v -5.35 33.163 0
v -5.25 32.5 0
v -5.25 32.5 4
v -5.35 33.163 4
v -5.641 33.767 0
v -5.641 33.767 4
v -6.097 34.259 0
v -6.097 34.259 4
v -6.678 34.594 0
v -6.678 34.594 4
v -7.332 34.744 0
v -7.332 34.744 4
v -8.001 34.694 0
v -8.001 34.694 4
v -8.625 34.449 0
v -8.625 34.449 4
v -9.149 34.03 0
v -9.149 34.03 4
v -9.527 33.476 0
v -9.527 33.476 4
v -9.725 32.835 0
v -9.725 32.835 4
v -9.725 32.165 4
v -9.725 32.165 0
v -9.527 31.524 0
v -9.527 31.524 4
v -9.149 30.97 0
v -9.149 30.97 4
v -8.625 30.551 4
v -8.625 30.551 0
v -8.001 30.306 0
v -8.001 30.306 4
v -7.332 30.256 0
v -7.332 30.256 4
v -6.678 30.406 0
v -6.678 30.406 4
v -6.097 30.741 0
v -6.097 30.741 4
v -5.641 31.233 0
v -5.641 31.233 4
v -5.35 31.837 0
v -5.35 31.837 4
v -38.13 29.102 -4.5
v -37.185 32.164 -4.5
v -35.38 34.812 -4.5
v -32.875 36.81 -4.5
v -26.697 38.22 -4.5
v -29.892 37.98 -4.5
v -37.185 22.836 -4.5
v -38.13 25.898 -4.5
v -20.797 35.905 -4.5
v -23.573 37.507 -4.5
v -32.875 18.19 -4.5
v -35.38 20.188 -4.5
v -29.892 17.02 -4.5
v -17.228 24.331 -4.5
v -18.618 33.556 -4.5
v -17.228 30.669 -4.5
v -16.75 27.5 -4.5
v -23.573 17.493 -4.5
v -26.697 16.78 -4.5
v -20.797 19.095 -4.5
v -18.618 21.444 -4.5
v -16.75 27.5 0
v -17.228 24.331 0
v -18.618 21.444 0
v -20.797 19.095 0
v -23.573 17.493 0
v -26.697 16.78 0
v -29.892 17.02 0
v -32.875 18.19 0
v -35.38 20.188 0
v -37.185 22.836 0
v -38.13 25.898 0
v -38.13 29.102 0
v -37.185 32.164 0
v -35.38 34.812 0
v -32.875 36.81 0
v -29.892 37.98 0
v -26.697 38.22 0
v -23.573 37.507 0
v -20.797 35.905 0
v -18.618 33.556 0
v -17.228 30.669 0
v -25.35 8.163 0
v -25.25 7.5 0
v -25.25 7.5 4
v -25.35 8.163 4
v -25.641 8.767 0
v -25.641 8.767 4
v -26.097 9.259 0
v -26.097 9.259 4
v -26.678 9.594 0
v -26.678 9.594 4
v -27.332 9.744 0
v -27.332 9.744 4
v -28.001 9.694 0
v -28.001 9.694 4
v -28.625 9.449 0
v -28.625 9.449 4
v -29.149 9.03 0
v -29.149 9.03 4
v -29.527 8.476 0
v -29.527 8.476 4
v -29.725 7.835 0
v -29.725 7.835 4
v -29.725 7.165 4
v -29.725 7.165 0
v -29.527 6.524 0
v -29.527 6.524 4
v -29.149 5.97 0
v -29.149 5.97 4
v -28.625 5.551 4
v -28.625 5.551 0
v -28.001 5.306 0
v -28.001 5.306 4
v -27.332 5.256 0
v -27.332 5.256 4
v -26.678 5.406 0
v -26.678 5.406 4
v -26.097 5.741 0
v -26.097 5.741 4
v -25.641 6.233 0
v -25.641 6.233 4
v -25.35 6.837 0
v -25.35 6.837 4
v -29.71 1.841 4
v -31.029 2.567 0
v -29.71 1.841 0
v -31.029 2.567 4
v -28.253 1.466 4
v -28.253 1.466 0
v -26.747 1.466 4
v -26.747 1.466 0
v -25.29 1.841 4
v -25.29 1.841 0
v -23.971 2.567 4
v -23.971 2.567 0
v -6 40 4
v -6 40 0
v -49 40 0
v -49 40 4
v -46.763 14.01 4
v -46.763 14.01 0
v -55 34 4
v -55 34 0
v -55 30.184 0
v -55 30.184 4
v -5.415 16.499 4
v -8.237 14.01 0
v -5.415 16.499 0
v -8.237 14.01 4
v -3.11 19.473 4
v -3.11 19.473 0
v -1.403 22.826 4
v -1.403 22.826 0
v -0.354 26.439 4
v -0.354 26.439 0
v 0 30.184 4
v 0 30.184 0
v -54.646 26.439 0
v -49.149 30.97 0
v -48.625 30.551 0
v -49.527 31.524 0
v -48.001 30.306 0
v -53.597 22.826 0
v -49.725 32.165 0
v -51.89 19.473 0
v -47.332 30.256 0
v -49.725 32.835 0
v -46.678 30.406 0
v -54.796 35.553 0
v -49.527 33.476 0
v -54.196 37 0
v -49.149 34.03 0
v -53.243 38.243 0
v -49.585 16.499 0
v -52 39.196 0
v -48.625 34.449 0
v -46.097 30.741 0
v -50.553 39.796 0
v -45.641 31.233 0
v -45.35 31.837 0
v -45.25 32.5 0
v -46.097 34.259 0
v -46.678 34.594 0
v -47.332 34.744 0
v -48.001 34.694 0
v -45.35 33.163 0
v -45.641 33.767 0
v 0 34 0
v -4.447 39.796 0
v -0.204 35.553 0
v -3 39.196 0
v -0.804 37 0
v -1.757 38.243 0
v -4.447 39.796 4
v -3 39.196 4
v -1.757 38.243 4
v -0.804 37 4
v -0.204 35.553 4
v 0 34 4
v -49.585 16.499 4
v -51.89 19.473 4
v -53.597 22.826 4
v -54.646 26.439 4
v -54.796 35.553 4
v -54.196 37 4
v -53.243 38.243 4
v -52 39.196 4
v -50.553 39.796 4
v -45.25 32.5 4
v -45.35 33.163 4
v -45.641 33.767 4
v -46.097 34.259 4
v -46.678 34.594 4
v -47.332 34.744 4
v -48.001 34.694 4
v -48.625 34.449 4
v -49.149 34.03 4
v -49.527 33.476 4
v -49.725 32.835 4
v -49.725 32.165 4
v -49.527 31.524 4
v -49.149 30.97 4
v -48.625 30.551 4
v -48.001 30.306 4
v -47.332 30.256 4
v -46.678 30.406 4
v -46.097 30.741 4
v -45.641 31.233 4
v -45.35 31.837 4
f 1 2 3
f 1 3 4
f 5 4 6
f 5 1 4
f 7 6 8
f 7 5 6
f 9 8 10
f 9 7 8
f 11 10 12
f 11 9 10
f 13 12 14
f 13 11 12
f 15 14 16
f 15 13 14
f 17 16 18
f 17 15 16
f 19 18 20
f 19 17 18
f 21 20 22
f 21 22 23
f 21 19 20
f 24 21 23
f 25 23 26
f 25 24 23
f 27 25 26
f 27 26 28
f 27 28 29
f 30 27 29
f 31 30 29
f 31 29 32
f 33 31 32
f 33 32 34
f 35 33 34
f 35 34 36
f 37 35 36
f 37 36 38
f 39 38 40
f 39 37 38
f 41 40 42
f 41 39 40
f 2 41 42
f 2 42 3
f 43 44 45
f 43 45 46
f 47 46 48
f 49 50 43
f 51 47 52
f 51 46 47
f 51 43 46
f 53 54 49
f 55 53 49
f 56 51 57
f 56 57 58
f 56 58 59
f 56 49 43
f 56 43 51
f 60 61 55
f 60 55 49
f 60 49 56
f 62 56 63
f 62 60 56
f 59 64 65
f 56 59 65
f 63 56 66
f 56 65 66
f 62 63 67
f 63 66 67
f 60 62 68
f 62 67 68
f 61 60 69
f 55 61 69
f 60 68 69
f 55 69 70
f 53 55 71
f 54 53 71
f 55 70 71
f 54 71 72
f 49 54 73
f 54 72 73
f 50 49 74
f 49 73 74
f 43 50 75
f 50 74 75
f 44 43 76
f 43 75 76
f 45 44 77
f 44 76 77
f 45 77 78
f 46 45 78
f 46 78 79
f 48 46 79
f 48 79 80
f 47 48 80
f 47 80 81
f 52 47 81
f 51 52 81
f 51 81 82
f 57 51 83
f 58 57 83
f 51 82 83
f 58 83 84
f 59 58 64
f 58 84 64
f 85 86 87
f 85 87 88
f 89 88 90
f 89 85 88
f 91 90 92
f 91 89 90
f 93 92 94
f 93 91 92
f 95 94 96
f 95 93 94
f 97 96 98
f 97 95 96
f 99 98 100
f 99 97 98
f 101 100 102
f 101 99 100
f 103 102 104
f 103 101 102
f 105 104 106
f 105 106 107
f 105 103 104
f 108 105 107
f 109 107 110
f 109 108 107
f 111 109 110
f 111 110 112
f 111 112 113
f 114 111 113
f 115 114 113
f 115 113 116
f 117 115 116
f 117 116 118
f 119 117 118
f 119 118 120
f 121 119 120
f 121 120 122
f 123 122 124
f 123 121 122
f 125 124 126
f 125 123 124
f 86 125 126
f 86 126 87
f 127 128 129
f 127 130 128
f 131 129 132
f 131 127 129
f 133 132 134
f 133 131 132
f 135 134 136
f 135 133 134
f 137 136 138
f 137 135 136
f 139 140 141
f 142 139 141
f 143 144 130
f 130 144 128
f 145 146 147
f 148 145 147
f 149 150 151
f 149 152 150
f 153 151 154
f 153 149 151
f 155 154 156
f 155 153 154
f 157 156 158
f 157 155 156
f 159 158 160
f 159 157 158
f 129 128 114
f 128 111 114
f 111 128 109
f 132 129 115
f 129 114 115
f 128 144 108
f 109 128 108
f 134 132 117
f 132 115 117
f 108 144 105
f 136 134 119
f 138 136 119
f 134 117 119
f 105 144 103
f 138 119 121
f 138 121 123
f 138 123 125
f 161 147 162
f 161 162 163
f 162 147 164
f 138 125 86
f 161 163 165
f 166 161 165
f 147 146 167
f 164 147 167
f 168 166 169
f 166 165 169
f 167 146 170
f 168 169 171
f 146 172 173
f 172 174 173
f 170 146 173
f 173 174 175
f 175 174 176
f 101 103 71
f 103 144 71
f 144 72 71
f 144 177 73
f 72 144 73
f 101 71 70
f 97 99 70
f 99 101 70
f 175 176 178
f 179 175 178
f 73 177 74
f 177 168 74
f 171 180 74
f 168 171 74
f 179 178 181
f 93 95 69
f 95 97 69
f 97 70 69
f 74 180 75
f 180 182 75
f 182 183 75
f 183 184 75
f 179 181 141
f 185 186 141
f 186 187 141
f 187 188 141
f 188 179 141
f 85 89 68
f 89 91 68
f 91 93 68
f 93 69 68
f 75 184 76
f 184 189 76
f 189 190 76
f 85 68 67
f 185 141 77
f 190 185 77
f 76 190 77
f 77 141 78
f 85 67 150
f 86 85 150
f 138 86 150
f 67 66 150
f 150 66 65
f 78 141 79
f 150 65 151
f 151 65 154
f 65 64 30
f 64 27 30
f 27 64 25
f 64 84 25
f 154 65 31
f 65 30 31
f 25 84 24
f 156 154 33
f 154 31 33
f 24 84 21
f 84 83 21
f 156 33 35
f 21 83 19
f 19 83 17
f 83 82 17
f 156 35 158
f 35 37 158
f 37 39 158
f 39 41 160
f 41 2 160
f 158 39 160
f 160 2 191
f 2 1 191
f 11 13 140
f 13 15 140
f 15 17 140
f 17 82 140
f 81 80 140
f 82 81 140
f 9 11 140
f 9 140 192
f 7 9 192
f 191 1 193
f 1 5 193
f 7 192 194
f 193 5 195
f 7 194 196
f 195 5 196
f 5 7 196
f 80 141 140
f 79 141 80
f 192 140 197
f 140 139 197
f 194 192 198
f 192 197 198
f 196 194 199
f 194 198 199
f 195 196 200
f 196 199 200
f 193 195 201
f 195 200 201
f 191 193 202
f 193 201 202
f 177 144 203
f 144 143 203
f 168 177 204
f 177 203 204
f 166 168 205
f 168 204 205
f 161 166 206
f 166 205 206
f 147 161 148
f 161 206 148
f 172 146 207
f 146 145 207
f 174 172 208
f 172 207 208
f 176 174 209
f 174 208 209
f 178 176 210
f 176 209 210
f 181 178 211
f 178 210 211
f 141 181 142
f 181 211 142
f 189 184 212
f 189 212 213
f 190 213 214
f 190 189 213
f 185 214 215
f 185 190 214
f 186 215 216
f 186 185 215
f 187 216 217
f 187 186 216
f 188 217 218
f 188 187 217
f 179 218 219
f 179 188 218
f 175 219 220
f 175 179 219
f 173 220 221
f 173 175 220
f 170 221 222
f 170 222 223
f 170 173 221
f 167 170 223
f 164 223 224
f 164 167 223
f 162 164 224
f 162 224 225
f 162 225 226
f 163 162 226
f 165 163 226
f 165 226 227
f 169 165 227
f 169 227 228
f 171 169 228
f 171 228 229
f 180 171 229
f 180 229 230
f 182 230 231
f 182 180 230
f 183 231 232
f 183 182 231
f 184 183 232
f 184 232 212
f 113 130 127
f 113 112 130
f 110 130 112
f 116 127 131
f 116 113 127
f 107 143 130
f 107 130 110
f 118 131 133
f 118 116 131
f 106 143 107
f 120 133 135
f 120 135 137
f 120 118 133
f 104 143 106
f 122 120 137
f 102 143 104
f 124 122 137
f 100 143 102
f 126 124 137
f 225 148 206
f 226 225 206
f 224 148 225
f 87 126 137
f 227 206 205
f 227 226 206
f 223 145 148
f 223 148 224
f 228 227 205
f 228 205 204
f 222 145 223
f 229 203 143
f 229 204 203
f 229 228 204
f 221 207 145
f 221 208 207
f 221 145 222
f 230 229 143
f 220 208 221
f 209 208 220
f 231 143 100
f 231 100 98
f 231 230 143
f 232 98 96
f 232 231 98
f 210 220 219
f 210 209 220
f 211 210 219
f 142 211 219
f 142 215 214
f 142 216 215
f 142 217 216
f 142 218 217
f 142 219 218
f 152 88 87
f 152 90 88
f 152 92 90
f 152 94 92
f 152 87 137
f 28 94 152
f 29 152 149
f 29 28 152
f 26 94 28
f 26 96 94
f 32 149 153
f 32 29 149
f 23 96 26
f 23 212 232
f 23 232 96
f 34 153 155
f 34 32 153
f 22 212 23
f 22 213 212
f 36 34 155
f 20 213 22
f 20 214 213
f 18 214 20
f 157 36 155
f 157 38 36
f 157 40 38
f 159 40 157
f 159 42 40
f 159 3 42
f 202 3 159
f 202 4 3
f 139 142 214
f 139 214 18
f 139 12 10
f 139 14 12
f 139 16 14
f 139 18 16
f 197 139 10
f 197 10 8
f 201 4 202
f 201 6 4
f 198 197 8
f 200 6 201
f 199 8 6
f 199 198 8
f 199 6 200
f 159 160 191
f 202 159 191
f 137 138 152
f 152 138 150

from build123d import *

# Parameters (mm, degrees)
ESQUISSE1_R        = 2.25
BOSS_EXTRU_1_DEPTH = 4
CONG_2_R           = 6
CONG_3_R           = 20
ESQUISSE2_R        = 10.75
BOSS_EXTRU_2_DEPTH = 4.5


with BuildPart() as part:
    # Esquisse1 → Boss.-Extru.1 (new body)
    with BuildSketch(Plane.XY):
        Polygon((-55, 20), (-27.5, 0), (0, 20), (0, 40), (-55, 40), align=None)
        with Locations((-47.5, 32.5)):
            Circle(ESQUISSE1_R, mode=Mode.SUBTRACT)
        with Locations((-7.5, 32.5)):
            Circle(ESQUISSE1_R, mode=Mode.SUBTRACT)
        with Locations((-27.5, 7.5)):
            Circle(ESQUISSE1_R, mode=Mode.SUBTRACT)
    extrude(amount=BOSS_EXTRU_1_DEPTH)

    # Congé2
    cong_2_edges = [part.edges().sort_by_distance(p)[0] for p in [
        (-55, 40, 2),
        (0, 40, 2),
        (-27.5, 0, 2),
    ]]
    fillet(cong_2_edges, radius=CONG_2_R)

    # Congé3
    cong_3_edges = [part.edges().sort_by_distance(p)[0] for p in [
        (0, 20, 2),
        (-55, 20, 2),
    ]]
    fillet(cong_3_edges, radius=CONG_3_R)

    # Esquisse2 → Boss.-Extru.2 (add)
    with BuildSketch(Plane(origin=(0, 0, 0), x_dir=(-1, 0, 0), z_dir=(0, 0, -1))):
        with Locations(Location((27.5, 27.5, 0), (0, 0, 180))):  # turned: the seam where the file's is
            Circle(ESQUISSE2_R)
    extrude(amount=BOSS_EXTRU_2_DEPTH)


solid = part.part
